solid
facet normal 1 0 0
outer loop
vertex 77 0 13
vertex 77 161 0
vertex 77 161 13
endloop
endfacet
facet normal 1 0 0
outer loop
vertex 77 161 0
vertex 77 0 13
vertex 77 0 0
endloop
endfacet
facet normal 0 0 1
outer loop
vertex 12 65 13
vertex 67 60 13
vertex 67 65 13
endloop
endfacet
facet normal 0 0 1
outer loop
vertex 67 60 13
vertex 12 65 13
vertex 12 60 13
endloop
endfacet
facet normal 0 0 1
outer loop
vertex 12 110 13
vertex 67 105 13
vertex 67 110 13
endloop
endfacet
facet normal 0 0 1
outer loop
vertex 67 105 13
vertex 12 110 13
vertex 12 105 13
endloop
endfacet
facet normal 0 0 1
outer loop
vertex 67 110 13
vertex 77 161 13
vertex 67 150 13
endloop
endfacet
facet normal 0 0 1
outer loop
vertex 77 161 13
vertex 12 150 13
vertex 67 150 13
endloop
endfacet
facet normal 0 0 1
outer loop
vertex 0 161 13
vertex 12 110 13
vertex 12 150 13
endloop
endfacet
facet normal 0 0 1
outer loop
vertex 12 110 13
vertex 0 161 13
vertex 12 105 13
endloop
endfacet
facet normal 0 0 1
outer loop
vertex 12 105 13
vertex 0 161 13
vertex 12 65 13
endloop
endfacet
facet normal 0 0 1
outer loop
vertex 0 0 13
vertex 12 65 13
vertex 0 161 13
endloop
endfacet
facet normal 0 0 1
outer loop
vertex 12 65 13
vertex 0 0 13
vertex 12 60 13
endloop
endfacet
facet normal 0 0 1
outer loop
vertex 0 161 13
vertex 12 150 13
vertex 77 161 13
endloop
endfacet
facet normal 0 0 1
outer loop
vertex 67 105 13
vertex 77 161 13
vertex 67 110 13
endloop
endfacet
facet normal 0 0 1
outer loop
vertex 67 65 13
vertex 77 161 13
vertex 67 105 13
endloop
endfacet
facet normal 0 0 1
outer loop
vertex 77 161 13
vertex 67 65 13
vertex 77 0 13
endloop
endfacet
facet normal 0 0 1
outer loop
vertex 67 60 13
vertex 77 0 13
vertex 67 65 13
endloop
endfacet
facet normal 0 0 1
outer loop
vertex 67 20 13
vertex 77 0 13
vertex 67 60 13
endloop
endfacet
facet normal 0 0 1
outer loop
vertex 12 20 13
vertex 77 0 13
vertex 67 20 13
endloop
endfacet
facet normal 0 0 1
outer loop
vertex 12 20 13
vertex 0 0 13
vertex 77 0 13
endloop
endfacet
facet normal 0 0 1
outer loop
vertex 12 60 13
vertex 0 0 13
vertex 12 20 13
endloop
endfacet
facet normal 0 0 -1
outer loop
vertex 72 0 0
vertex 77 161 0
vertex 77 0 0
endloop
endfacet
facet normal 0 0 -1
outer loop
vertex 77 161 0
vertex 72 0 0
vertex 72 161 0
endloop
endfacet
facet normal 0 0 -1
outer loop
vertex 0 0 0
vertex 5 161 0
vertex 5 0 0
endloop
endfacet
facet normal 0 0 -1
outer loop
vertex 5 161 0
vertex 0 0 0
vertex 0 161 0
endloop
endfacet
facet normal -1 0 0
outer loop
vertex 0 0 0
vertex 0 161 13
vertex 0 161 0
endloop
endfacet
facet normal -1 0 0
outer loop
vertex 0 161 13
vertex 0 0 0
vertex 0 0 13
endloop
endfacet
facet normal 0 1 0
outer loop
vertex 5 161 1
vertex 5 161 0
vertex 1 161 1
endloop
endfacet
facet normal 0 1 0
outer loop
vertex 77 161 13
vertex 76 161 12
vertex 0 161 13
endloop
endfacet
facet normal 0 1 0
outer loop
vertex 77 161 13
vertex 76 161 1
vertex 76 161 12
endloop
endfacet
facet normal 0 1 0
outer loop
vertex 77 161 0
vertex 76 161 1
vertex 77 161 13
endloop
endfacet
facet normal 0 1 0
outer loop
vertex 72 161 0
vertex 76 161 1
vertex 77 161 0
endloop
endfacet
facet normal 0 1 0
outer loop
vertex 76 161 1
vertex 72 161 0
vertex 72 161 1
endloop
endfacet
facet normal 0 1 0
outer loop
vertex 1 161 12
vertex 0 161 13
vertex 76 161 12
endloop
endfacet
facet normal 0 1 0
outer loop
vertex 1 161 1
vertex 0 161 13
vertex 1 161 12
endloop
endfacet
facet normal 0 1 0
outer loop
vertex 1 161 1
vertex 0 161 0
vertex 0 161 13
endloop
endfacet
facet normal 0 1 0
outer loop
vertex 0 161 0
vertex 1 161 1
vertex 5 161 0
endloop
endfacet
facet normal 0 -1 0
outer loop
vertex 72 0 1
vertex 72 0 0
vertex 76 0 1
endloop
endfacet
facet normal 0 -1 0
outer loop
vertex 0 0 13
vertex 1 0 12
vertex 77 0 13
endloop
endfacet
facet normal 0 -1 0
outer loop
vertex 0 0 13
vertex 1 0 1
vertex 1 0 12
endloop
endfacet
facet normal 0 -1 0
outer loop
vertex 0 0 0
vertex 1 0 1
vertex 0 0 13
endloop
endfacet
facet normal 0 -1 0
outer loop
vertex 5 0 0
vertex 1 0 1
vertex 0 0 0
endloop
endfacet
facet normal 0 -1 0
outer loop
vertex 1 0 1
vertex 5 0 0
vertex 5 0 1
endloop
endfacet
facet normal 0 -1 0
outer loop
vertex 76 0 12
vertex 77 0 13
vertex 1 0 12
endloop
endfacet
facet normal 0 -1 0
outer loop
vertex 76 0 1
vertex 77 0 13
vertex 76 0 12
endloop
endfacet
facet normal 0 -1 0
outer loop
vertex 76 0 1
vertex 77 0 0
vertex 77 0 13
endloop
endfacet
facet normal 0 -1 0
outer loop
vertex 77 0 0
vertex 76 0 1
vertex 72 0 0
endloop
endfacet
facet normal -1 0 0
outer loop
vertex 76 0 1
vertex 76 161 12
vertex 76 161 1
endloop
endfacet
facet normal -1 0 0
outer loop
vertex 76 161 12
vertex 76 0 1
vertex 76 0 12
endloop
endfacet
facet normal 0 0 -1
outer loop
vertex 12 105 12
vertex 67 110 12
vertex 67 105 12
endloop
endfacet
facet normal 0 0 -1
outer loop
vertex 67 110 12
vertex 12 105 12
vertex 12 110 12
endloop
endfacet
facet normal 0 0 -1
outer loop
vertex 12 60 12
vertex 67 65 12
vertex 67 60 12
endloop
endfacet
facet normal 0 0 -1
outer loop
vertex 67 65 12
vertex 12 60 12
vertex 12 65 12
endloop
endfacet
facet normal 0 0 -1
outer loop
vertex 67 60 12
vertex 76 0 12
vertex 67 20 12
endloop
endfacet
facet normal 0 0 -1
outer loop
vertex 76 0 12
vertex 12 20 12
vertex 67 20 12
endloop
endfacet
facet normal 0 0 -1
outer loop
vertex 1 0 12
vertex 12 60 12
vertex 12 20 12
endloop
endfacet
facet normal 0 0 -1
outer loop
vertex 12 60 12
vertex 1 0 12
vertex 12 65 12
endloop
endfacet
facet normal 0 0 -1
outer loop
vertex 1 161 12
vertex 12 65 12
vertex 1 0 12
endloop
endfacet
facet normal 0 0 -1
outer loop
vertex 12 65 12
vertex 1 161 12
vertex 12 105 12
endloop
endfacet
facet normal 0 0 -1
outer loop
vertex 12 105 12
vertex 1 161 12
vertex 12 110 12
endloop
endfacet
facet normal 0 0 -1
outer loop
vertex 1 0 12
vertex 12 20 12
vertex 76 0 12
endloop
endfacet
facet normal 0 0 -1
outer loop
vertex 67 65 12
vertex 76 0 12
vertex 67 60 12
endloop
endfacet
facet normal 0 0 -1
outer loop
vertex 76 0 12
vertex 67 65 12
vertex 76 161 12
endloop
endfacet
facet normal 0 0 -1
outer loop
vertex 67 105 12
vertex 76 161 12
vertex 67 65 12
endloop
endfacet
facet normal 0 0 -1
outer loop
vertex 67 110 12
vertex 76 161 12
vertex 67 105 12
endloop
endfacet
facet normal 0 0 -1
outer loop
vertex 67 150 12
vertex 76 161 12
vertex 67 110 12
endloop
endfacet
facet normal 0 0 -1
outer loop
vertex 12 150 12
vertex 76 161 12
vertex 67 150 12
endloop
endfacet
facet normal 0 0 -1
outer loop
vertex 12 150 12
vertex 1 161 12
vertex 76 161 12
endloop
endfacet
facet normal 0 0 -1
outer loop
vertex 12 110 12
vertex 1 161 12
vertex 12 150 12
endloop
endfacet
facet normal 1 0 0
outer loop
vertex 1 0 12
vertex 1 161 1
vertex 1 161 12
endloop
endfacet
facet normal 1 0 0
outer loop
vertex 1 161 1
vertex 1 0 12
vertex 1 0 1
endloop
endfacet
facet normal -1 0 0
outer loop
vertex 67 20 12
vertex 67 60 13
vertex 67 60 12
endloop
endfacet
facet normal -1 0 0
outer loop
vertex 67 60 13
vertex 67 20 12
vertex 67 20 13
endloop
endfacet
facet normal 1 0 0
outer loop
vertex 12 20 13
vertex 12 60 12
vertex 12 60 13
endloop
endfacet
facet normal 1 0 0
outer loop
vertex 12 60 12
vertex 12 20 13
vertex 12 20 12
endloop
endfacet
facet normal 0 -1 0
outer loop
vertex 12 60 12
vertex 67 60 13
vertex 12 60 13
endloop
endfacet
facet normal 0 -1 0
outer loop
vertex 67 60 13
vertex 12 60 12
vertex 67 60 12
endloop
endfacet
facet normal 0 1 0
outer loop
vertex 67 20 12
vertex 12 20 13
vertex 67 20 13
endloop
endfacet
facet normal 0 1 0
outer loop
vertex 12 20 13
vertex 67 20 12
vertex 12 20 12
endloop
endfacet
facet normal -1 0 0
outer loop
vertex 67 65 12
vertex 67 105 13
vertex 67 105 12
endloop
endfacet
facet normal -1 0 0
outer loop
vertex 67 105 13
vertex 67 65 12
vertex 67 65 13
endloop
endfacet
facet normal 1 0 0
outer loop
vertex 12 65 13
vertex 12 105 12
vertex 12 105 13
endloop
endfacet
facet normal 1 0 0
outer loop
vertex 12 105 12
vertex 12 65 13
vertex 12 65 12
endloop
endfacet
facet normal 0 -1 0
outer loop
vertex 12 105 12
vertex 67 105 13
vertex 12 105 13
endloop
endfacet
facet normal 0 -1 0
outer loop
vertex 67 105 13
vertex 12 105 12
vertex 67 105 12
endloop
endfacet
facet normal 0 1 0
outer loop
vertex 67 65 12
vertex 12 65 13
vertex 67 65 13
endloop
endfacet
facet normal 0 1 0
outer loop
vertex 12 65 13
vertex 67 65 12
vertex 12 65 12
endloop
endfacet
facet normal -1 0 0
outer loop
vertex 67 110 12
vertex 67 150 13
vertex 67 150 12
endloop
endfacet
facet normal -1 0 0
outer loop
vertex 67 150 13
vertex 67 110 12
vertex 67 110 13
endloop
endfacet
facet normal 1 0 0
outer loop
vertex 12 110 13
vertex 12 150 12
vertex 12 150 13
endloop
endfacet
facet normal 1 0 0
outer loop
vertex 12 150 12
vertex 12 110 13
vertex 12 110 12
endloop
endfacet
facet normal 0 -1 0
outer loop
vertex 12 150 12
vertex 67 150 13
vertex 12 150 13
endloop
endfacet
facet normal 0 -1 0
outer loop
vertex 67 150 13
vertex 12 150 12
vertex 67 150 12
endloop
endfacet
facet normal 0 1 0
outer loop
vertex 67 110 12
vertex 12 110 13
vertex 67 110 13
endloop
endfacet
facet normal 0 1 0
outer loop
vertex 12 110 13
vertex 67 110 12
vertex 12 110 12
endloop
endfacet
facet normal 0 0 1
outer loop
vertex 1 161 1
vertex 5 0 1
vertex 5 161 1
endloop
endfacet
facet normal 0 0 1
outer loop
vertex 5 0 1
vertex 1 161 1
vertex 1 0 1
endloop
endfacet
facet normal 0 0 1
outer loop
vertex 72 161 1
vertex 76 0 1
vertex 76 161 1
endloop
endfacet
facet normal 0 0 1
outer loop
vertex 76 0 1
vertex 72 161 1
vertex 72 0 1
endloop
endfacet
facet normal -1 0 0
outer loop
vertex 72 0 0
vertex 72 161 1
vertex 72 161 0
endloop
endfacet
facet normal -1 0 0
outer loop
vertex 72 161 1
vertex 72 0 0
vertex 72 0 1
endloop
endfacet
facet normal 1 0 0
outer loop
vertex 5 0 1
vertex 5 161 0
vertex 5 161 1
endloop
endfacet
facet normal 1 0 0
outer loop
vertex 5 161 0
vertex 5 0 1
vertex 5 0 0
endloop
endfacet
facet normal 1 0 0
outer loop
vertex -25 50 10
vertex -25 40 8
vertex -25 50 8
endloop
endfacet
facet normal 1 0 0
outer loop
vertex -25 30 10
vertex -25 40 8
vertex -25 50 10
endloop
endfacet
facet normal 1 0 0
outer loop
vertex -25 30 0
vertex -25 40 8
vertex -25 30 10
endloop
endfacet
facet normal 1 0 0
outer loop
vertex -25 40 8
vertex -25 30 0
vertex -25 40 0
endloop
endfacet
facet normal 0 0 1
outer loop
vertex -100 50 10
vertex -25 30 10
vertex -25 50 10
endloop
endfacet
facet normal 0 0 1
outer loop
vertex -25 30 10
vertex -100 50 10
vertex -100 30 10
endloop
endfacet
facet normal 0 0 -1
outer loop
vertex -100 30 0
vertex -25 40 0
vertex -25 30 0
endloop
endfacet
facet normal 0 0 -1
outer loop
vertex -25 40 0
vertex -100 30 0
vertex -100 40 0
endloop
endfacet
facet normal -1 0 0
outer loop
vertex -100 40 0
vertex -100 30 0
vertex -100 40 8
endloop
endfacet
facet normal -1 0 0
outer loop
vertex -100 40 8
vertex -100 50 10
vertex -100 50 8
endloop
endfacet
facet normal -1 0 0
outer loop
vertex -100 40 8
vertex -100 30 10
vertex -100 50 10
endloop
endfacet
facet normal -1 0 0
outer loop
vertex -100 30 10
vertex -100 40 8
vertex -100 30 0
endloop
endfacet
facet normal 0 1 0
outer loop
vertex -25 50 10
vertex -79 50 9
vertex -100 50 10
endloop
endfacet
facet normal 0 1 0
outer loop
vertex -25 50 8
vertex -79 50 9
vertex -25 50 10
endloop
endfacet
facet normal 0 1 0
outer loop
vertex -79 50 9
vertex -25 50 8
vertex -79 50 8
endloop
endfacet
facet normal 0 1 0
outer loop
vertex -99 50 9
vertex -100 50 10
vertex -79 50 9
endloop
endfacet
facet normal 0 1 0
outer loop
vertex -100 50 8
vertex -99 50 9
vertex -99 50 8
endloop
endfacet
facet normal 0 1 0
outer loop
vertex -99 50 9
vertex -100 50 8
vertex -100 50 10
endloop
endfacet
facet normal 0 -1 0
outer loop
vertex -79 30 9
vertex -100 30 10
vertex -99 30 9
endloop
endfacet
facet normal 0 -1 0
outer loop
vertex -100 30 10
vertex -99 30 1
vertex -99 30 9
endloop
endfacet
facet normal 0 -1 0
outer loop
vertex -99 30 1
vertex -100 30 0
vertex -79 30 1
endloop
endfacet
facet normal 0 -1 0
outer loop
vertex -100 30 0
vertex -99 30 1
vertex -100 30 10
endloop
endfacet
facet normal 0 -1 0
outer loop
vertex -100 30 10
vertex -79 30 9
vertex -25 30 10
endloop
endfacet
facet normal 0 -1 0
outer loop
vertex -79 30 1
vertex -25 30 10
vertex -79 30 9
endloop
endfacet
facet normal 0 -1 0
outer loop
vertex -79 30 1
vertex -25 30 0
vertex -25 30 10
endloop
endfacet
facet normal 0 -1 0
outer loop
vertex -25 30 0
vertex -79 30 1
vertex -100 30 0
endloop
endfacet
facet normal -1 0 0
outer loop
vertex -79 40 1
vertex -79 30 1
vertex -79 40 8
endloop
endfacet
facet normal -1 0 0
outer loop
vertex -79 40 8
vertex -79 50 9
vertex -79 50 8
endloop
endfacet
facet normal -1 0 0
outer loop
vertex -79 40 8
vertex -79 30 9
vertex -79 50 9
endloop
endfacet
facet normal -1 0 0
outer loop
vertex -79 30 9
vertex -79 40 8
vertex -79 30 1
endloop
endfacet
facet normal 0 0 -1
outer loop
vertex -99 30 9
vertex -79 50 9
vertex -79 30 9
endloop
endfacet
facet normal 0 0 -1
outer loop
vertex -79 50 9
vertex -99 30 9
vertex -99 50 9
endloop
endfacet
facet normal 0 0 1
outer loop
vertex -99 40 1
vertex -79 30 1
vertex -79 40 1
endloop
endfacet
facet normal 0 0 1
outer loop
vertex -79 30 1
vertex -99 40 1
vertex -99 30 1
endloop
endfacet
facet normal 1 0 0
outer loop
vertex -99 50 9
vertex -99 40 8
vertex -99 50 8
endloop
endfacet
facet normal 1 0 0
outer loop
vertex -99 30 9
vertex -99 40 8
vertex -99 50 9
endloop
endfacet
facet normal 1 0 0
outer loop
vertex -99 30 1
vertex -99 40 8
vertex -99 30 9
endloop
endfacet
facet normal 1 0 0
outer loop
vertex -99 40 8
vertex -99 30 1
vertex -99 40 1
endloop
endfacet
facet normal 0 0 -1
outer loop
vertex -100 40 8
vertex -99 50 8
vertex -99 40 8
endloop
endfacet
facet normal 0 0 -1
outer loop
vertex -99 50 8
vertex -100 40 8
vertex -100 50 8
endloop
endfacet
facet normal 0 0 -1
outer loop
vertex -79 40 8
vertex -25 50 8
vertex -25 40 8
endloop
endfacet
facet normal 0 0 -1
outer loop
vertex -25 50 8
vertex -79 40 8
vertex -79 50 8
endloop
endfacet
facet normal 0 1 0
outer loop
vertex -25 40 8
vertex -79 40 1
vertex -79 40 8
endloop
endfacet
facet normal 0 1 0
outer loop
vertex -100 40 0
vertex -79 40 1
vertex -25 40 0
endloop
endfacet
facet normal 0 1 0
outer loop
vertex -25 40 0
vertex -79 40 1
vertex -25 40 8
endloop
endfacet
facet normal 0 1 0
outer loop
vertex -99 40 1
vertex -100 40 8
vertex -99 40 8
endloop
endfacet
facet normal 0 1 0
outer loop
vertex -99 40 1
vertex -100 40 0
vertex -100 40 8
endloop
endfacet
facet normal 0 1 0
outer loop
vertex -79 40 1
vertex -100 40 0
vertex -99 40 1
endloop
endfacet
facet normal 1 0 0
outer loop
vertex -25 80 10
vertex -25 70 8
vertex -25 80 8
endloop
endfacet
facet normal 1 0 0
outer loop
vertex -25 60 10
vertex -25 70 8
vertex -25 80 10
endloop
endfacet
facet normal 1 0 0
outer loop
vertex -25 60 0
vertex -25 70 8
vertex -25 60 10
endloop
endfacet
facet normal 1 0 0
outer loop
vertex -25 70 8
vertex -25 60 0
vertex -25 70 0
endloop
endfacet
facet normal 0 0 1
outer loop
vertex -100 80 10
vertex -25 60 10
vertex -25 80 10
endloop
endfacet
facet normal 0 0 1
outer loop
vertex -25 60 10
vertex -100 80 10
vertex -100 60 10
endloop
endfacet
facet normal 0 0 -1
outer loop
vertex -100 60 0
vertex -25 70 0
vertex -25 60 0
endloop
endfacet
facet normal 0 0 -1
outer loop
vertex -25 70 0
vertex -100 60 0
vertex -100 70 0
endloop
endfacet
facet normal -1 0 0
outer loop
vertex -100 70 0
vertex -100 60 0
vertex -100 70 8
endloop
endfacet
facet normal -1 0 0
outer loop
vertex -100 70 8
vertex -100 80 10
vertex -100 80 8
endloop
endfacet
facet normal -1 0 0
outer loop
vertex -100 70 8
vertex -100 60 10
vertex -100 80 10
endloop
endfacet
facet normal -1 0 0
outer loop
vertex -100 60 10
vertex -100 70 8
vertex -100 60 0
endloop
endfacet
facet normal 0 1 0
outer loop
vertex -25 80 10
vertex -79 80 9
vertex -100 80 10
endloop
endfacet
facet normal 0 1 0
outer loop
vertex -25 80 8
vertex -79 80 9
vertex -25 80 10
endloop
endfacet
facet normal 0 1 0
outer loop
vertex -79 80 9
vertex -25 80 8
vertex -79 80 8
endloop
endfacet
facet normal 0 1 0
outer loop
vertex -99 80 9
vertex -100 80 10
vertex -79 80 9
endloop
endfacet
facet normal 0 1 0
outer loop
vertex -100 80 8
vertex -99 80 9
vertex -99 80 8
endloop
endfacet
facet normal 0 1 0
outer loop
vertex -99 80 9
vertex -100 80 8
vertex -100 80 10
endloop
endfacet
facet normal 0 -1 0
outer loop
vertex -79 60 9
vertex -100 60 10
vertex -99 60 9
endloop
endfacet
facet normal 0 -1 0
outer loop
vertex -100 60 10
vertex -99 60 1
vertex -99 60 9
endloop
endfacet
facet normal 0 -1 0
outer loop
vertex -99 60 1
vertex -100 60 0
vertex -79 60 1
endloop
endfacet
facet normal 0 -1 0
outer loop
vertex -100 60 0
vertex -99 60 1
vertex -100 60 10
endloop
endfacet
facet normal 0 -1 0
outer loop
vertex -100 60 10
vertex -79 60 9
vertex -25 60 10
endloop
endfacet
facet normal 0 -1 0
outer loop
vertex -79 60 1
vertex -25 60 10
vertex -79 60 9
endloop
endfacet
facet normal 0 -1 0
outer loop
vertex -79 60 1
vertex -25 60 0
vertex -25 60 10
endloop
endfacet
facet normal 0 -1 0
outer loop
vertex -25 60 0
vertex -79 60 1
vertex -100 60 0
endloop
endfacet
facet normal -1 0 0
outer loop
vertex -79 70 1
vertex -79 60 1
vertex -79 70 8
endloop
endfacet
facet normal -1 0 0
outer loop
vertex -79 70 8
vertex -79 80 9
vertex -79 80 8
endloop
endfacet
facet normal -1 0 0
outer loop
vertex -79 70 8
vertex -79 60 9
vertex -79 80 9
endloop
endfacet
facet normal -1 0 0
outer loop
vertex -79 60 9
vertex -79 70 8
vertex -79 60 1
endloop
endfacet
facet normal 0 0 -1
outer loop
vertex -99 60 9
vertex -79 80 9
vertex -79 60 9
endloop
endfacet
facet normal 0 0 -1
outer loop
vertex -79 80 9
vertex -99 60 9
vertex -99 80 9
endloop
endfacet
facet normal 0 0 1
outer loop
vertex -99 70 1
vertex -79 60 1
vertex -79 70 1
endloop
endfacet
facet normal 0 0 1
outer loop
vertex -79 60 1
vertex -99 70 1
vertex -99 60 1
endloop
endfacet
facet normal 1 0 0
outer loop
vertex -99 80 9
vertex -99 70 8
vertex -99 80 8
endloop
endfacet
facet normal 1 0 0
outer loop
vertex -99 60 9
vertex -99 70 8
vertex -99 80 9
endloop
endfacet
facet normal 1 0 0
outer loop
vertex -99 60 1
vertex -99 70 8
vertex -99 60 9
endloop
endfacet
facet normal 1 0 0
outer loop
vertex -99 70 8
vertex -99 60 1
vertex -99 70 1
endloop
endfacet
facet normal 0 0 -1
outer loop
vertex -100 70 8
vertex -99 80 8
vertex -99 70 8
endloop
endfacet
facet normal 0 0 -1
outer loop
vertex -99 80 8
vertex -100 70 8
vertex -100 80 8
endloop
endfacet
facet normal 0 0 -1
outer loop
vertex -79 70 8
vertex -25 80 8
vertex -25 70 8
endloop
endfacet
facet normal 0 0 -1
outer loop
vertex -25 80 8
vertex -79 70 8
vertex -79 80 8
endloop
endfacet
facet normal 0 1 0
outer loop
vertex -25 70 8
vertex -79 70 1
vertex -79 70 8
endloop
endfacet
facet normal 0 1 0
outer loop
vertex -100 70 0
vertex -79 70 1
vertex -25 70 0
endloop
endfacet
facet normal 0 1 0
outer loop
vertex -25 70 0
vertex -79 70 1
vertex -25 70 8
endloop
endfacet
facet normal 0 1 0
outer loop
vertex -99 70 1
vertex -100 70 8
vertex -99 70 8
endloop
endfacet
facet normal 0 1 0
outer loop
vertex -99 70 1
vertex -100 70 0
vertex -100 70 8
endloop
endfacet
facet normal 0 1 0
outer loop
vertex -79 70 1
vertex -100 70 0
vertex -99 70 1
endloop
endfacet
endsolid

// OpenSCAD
	module vroneTray()
	{  
		difference(){
		  difference(){
		  	cube([77,161,13]);
		   translate([1,0,0])
	      	cube([75,161,12]);
	 	   }
			translate([12,20,12])
				cube([55,40,1]);
			translate([12,65,12])
				cube([55,40,1]);
			translate([12,110,12])
				cube([55,40,1]);
		}	
	   difference(){
	  		cube([77,161,1]);
			translate([5,0,0])
	   	  	cube([67,161,12]);
		}		
	}
	
	
	module vroneTrayPlug(){
		for(i = [1 : 2])
	   	translate([-100,30*i,0])
			difference(){
				difference(){
						cube([75,20,10]);
						translate([1,0,1])
							cube([20,20,8]);
			 	}
				translate([0,10,0])
					cube([75,20,8]);
			}				
	}
	
	
	vroneTray();
	vroneTrayPlug();
